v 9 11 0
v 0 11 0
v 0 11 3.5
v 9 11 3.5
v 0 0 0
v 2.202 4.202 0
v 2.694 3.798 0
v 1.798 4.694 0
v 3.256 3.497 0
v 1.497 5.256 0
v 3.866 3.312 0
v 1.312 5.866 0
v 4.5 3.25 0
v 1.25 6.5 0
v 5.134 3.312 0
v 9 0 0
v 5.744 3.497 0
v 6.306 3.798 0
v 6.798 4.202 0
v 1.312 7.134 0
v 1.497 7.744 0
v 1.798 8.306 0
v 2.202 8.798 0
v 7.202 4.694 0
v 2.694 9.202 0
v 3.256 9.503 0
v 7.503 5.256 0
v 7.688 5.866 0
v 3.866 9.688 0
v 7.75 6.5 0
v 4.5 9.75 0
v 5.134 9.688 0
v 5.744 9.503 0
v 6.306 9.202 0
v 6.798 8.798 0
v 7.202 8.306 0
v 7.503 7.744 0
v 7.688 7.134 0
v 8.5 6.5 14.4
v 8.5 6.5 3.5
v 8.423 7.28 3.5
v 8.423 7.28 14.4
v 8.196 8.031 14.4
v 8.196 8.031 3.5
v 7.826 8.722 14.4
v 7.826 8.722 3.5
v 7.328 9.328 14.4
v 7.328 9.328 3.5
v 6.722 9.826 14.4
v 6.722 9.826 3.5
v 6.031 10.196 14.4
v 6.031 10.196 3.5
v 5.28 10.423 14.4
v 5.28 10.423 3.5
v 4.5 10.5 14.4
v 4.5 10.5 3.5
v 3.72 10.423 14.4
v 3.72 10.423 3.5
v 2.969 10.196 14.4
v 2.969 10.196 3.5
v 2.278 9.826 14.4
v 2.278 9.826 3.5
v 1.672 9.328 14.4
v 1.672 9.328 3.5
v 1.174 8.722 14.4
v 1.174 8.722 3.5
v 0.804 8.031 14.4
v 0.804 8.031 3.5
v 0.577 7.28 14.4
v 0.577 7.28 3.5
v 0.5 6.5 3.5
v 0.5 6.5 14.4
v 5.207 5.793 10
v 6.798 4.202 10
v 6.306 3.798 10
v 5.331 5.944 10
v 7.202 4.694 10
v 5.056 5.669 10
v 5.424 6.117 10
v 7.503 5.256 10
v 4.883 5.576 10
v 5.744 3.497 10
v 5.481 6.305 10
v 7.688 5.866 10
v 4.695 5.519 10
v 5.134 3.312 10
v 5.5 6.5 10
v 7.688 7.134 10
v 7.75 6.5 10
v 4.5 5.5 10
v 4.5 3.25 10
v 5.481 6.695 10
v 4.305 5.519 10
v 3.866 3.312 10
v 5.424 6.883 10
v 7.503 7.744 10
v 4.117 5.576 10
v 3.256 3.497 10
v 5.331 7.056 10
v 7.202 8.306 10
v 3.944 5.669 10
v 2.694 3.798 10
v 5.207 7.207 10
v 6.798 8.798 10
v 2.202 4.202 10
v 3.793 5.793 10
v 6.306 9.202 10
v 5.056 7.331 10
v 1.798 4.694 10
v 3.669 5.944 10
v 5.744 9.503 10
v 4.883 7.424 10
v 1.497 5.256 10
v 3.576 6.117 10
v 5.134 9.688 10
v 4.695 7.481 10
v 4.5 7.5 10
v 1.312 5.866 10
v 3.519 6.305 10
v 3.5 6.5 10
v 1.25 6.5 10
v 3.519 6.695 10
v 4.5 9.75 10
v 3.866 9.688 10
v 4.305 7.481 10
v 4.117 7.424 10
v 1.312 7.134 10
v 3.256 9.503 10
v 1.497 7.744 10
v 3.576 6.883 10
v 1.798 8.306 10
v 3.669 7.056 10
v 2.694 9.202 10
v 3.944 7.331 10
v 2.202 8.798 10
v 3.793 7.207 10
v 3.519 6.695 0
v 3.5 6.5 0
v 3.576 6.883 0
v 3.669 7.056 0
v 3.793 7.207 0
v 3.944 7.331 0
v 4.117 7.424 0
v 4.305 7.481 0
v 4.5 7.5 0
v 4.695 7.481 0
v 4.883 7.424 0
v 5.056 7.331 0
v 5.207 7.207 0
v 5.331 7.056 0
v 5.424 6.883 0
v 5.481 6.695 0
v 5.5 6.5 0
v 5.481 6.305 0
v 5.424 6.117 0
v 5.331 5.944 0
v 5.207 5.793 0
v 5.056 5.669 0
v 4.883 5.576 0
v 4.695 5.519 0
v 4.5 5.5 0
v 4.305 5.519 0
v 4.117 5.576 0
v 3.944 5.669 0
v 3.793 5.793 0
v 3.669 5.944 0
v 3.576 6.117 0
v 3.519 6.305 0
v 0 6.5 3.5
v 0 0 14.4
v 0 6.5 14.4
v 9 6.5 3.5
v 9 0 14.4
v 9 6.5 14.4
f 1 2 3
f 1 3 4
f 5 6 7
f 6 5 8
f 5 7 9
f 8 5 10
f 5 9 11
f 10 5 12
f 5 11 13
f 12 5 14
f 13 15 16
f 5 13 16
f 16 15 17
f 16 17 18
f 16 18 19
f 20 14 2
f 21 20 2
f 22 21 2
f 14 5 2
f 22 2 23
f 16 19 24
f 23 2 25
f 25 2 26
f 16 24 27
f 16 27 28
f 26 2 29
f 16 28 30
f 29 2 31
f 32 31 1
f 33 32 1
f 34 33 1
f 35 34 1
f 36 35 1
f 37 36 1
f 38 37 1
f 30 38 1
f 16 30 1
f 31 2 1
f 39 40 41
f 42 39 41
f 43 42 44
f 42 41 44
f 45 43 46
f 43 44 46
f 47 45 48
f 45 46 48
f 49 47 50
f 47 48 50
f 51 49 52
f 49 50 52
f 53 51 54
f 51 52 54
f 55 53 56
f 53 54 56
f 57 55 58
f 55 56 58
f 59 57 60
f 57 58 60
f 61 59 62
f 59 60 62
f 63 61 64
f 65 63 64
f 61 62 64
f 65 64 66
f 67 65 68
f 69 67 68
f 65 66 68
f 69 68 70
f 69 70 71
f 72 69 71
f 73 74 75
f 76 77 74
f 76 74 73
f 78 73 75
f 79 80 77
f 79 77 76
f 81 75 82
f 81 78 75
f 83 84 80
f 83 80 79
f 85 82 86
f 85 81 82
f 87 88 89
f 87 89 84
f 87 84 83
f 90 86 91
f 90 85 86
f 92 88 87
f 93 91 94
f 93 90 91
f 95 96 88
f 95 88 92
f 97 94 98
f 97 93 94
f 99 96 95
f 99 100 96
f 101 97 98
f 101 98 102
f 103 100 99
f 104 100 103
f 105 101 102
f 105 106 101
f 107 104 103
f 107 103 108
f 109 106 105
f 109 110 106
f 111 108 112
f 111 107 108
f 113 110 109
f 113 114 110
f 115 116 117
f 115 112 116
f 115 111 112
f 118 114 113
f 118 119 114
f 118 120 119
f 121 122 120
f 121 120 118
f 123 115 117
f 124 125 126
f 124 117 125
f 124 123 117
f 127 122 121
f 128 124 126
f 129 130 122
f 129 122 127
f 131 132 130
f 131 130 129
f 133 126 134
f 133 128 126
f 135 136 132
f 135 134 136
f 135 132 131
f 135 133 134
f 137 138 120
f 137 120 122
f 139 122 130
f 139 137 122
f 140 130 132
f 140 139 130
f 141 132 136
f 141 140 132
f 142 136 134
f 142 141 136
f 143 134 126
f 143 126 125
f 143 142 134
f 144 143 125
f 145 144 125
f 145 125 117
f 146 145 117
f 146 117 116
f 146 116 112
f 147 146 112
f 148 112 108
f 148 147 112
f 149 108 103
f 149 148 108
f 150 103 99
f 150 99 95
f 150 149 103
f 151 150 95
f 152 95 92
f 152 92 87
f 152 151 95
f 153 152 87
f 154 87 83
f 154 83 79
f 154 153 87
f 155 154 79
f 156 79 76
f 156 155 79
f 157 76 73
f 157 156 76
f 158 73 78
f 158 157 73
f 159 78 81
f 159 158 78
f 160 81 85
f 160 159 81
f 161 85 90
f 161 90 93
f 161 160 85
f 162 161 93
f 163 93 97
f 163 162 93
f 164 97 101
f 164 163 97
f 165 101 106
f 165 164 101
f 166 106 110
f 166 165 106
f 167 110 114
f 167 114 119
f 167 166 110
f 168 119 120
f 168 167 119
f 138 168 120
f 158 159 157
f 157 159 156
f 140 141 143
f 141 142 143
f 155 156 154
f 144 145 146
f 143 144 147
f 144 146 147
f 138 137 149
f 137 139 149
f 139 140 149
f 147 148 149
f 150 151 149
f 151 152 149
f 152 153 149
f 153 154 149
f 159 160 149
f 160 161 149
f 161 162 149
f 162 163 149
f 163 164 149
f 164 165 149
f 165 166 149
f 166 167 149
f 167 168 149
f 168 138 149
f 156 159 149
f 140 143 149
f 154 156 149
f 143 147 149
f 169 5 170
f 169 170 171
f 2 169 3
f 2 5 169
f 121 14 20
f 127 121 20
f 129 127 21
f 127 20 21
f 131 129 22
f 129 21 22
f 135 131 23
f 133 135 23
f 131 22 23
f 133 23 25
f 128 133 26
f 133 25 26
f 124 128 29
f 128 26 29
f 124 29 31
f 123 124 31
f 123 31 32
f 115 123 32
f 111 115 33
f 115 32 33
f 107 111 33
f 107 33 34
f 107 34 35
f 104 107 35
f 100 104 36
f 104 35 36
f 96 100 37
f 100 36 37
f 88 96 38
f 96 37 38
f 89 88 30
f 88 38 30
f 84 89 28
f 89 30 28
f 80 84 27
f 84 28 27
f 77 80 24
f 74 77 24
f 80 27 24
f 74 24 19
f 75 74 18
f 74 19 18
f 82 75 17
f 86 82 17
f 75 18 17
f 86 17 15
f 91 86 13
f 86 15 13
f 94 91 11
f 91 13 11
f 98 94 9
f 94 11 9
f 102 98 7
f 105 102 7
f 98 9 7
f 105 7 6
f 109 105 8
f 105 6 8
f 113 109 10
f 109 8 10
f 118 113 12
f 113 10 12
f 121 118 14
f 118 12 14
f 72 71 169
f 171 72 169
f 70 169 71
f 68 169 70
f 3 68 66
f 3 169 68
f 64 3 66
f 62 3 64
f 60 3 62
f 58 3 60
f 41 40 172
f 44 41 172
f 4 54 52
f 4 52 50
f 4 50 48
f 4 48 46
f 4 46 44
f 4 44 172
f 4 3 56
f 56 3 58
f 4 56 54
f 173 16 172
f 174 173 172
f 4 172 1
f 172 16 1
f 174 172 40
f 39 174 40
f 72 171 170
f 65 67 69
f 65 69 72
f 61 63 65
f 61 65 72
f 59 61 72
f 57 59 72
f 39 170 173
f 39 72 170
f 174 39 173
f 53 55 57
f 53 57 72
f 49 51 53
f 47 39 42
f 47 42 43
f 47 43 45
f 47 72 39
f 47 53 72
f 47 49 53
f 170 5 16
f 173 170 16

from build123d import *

# Parameters (mm, degrees)
SKETCH1_W           = 9
SKETCH1_H           = 11
BOSS_EXTRUDE1_DEPTH = 3.5
BOSS_EXTRUDE2_DEPTH = 14.4
SKETCH3_R           = 3.25
SKETCH3_R_2         = 1
CUT_EXTRUDE1_DEPTH  = 10


with BuildPart() as part:
    # Sketch1 → Boss-Extrude1 (new body)
    with BuildSketch(Plane.XY):
        with Locations((4.5, 5.5)):
            Rectangle(SKETCH1_W, SKETCH1_H)
    extrude(amount=BOSS_EXTRUDE1_DEPTH)

    # Sketch2 → Boss-Extrude2 (add)
    with BuildSketch(Plane(origin=(0, 0, 0), x_dir=(-1, 0, 0), z_dir=(0, 0, -1))):
        with BuildLine():
            Line((-0.5, 6.5), (0, 6.5))
            Line((0, 6.5), (0, 0))
            Line((0, 0), (-9, 0))
            Line((-9, 0), (-9, 6.5))
            Line((-9, 6.5), (-8.5, 6.5))
            ThreePointArc((-8.5, 6.5), (-4.5, 10.5), (-0.5, 6.5))
        make_face()
    extrude(amount=-BOSS_EXTRUDE2_DEPTH)

    # Sketch3 → Cut-Extrude1 (cut)
    with BuildSketch(Plane(origin=(0, 0, 0), x_dir=(-1, 0, 0), z_dir=(0, 0, -1))):
        with Locations((-4.5, 6.5)):
            Circle(SKETCH3_R)
        with Locations((-4.5, 6.5)):
            Circle(SKETCH3_R_2, mode=Mode.SUBTRACT)
    extrude(amount=-CUT_EXTRUDE1_DEPTH, mode=Mode.SUBTRACT)


solid = part.part
